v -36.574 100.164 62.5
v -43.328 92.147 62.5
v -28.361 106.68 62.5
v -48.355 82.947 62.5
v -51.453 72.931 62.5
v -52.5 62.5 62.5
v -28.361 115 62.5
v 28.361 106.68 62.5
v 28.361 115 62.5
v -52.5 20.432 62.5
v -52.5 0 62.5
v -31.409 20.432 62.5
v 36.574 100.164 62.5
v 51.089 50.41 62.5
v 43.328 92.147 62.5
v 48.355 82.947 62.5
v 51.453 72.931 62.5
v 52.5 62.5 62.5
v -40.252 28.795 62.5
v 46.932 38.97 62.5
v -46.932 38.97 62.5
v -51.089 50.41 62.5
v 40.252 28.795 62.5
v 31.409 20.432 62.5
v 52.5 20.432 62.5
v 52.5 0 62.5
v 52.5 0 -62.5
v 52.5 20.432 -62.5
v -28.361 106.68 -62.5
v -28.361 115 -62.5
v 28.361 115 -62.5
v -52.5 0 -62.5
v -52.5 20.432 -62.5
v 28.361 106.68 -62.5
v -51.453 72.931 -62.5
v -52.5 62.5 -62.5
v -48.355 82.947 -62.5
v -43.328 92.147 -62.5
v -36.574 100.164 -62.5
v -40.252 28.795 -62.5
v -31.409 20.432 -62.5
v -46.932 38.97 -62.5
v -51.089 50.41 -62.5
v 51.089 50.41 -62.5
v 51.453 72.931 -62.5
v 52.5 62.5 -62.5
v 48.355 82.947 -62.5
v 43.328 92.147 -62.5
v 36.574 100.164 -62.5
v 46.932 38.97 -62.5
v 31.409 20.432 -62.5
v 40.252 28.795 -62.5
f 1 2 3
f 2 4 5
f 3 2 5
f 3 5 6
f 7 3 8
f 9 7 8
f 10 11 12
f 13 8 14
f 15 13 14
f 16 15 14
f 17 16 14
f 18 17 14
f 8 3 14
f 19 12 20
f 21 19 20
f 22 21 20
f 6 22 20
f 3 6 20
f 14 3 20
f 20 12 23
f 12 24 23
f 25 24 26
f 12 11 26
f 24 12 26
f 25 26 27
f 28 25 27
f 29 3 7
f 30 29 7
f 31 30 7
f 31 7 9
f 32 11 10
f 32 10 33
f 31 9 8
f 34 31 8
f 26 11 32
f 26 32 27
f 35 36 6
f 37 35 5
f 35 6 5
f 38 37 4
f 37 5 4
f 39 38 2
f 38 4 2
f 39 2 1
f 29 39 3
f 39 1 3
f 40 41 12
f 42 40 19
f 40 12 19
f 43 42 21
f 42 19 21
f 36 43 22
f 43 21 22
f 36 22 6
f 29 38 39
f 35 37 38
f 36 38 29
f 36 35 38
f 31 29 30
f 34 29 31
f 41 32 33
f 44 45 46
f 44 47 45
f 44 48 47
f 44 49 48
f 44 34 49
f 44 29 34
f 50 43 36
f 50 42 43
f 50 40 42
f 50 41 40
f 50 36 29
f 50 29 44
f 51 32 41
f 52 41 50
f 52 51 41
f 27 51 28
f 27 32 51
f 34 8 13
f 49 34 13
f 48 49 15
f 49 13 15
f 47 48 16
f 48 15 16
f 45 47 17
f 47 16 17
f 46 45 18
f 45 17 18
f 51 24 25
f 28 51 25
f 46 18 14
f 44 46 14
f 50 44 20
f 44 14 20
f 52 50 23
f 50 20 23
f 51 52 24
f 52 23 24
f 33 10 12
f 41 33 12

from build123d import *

# Parameters (mm, degrees)
SKETCH_1_W               = 105
SKETCH_1_H               = 125
EXTRUDE_1_DEPTH          = 115
CUT_EXTRUDE_1_DEPTH      = 1
CUT_EXTRUDE_1_DEPTH_BACK = 126


with BuildPart() as part:
    # Эскиз1 → Бобышка-Вытянуть1 (new body)
    with BuildSketch(Plane(origin=(0, 0, 0), x_dir=(1, 0, 0), z_dir=(0, 1, 0))):
        Rectangle(SKETCH_1_W, SKETCH_1_H)
    extrude(amount=EXTRUDE_1_DEPTH)

    # Эскиз2 → Вырез-Вытянуть1 (cut, two sides)
    with BuildSketch(Plane.XY.offset(62.5)) as cut_extrude_1_sk:
        with BuildLine():
            ThreePointArc((-52.5, 62.5), (-46.071684117, 87.67240399), (-28.360955327, 106.680382671))
            Line((-28.360955327, 106.680382671), (-28.360955327, 115))
            Line((-28.360955327, 115), (-52.5, 115))
            Line((-52.5, 115), (-52.5, 62.5))
        make_face()
        with BuildLine():
            ThreePointArc((-31.408561264, 20.43157622), (-46.931862665, 38.970225951), (-52.5, 62.5))
            Line((-52.5, 62.5), (-52.5, 20.43157622))
            Line((-52.5, 20.43157622), (-31.408561264, 20.43157622))
        make_face()
        with BuildLine():
            Line((52.5, 20.43157622), (52.5, 62.499999878))
            ThreePointArc((52.5, 62.499999878), (46.931862637, 38.970225896), (31.408561264, 20.43157622))
            Line((31.408561264, 20.43157622), (52.5, 20.43157622))
        make_face()
        with BuildLine():
            Line((52.5, 115), (28.360955327, 115))
            Line((28.360955327, 115), (28.360955327, 106.680382671))
            ThreePointArc((28.360955327, 106.680382671), (46.071684146, 87.672403937), (52.5, 62.499999878))
            Line((52.5, 62.499999878), (52.5, 115))
        make_face()
    extrude(amount=CUT_EXTRUDE_1_DEPTH, mode=Mode.SUBTRACT)
    extrude(cut_extrude_1_sk.sketch, amount=-CUT_EXTRUDE_1_DEPTH_BACK, mode=Mode.SUBTRACT)


solid = part.part
